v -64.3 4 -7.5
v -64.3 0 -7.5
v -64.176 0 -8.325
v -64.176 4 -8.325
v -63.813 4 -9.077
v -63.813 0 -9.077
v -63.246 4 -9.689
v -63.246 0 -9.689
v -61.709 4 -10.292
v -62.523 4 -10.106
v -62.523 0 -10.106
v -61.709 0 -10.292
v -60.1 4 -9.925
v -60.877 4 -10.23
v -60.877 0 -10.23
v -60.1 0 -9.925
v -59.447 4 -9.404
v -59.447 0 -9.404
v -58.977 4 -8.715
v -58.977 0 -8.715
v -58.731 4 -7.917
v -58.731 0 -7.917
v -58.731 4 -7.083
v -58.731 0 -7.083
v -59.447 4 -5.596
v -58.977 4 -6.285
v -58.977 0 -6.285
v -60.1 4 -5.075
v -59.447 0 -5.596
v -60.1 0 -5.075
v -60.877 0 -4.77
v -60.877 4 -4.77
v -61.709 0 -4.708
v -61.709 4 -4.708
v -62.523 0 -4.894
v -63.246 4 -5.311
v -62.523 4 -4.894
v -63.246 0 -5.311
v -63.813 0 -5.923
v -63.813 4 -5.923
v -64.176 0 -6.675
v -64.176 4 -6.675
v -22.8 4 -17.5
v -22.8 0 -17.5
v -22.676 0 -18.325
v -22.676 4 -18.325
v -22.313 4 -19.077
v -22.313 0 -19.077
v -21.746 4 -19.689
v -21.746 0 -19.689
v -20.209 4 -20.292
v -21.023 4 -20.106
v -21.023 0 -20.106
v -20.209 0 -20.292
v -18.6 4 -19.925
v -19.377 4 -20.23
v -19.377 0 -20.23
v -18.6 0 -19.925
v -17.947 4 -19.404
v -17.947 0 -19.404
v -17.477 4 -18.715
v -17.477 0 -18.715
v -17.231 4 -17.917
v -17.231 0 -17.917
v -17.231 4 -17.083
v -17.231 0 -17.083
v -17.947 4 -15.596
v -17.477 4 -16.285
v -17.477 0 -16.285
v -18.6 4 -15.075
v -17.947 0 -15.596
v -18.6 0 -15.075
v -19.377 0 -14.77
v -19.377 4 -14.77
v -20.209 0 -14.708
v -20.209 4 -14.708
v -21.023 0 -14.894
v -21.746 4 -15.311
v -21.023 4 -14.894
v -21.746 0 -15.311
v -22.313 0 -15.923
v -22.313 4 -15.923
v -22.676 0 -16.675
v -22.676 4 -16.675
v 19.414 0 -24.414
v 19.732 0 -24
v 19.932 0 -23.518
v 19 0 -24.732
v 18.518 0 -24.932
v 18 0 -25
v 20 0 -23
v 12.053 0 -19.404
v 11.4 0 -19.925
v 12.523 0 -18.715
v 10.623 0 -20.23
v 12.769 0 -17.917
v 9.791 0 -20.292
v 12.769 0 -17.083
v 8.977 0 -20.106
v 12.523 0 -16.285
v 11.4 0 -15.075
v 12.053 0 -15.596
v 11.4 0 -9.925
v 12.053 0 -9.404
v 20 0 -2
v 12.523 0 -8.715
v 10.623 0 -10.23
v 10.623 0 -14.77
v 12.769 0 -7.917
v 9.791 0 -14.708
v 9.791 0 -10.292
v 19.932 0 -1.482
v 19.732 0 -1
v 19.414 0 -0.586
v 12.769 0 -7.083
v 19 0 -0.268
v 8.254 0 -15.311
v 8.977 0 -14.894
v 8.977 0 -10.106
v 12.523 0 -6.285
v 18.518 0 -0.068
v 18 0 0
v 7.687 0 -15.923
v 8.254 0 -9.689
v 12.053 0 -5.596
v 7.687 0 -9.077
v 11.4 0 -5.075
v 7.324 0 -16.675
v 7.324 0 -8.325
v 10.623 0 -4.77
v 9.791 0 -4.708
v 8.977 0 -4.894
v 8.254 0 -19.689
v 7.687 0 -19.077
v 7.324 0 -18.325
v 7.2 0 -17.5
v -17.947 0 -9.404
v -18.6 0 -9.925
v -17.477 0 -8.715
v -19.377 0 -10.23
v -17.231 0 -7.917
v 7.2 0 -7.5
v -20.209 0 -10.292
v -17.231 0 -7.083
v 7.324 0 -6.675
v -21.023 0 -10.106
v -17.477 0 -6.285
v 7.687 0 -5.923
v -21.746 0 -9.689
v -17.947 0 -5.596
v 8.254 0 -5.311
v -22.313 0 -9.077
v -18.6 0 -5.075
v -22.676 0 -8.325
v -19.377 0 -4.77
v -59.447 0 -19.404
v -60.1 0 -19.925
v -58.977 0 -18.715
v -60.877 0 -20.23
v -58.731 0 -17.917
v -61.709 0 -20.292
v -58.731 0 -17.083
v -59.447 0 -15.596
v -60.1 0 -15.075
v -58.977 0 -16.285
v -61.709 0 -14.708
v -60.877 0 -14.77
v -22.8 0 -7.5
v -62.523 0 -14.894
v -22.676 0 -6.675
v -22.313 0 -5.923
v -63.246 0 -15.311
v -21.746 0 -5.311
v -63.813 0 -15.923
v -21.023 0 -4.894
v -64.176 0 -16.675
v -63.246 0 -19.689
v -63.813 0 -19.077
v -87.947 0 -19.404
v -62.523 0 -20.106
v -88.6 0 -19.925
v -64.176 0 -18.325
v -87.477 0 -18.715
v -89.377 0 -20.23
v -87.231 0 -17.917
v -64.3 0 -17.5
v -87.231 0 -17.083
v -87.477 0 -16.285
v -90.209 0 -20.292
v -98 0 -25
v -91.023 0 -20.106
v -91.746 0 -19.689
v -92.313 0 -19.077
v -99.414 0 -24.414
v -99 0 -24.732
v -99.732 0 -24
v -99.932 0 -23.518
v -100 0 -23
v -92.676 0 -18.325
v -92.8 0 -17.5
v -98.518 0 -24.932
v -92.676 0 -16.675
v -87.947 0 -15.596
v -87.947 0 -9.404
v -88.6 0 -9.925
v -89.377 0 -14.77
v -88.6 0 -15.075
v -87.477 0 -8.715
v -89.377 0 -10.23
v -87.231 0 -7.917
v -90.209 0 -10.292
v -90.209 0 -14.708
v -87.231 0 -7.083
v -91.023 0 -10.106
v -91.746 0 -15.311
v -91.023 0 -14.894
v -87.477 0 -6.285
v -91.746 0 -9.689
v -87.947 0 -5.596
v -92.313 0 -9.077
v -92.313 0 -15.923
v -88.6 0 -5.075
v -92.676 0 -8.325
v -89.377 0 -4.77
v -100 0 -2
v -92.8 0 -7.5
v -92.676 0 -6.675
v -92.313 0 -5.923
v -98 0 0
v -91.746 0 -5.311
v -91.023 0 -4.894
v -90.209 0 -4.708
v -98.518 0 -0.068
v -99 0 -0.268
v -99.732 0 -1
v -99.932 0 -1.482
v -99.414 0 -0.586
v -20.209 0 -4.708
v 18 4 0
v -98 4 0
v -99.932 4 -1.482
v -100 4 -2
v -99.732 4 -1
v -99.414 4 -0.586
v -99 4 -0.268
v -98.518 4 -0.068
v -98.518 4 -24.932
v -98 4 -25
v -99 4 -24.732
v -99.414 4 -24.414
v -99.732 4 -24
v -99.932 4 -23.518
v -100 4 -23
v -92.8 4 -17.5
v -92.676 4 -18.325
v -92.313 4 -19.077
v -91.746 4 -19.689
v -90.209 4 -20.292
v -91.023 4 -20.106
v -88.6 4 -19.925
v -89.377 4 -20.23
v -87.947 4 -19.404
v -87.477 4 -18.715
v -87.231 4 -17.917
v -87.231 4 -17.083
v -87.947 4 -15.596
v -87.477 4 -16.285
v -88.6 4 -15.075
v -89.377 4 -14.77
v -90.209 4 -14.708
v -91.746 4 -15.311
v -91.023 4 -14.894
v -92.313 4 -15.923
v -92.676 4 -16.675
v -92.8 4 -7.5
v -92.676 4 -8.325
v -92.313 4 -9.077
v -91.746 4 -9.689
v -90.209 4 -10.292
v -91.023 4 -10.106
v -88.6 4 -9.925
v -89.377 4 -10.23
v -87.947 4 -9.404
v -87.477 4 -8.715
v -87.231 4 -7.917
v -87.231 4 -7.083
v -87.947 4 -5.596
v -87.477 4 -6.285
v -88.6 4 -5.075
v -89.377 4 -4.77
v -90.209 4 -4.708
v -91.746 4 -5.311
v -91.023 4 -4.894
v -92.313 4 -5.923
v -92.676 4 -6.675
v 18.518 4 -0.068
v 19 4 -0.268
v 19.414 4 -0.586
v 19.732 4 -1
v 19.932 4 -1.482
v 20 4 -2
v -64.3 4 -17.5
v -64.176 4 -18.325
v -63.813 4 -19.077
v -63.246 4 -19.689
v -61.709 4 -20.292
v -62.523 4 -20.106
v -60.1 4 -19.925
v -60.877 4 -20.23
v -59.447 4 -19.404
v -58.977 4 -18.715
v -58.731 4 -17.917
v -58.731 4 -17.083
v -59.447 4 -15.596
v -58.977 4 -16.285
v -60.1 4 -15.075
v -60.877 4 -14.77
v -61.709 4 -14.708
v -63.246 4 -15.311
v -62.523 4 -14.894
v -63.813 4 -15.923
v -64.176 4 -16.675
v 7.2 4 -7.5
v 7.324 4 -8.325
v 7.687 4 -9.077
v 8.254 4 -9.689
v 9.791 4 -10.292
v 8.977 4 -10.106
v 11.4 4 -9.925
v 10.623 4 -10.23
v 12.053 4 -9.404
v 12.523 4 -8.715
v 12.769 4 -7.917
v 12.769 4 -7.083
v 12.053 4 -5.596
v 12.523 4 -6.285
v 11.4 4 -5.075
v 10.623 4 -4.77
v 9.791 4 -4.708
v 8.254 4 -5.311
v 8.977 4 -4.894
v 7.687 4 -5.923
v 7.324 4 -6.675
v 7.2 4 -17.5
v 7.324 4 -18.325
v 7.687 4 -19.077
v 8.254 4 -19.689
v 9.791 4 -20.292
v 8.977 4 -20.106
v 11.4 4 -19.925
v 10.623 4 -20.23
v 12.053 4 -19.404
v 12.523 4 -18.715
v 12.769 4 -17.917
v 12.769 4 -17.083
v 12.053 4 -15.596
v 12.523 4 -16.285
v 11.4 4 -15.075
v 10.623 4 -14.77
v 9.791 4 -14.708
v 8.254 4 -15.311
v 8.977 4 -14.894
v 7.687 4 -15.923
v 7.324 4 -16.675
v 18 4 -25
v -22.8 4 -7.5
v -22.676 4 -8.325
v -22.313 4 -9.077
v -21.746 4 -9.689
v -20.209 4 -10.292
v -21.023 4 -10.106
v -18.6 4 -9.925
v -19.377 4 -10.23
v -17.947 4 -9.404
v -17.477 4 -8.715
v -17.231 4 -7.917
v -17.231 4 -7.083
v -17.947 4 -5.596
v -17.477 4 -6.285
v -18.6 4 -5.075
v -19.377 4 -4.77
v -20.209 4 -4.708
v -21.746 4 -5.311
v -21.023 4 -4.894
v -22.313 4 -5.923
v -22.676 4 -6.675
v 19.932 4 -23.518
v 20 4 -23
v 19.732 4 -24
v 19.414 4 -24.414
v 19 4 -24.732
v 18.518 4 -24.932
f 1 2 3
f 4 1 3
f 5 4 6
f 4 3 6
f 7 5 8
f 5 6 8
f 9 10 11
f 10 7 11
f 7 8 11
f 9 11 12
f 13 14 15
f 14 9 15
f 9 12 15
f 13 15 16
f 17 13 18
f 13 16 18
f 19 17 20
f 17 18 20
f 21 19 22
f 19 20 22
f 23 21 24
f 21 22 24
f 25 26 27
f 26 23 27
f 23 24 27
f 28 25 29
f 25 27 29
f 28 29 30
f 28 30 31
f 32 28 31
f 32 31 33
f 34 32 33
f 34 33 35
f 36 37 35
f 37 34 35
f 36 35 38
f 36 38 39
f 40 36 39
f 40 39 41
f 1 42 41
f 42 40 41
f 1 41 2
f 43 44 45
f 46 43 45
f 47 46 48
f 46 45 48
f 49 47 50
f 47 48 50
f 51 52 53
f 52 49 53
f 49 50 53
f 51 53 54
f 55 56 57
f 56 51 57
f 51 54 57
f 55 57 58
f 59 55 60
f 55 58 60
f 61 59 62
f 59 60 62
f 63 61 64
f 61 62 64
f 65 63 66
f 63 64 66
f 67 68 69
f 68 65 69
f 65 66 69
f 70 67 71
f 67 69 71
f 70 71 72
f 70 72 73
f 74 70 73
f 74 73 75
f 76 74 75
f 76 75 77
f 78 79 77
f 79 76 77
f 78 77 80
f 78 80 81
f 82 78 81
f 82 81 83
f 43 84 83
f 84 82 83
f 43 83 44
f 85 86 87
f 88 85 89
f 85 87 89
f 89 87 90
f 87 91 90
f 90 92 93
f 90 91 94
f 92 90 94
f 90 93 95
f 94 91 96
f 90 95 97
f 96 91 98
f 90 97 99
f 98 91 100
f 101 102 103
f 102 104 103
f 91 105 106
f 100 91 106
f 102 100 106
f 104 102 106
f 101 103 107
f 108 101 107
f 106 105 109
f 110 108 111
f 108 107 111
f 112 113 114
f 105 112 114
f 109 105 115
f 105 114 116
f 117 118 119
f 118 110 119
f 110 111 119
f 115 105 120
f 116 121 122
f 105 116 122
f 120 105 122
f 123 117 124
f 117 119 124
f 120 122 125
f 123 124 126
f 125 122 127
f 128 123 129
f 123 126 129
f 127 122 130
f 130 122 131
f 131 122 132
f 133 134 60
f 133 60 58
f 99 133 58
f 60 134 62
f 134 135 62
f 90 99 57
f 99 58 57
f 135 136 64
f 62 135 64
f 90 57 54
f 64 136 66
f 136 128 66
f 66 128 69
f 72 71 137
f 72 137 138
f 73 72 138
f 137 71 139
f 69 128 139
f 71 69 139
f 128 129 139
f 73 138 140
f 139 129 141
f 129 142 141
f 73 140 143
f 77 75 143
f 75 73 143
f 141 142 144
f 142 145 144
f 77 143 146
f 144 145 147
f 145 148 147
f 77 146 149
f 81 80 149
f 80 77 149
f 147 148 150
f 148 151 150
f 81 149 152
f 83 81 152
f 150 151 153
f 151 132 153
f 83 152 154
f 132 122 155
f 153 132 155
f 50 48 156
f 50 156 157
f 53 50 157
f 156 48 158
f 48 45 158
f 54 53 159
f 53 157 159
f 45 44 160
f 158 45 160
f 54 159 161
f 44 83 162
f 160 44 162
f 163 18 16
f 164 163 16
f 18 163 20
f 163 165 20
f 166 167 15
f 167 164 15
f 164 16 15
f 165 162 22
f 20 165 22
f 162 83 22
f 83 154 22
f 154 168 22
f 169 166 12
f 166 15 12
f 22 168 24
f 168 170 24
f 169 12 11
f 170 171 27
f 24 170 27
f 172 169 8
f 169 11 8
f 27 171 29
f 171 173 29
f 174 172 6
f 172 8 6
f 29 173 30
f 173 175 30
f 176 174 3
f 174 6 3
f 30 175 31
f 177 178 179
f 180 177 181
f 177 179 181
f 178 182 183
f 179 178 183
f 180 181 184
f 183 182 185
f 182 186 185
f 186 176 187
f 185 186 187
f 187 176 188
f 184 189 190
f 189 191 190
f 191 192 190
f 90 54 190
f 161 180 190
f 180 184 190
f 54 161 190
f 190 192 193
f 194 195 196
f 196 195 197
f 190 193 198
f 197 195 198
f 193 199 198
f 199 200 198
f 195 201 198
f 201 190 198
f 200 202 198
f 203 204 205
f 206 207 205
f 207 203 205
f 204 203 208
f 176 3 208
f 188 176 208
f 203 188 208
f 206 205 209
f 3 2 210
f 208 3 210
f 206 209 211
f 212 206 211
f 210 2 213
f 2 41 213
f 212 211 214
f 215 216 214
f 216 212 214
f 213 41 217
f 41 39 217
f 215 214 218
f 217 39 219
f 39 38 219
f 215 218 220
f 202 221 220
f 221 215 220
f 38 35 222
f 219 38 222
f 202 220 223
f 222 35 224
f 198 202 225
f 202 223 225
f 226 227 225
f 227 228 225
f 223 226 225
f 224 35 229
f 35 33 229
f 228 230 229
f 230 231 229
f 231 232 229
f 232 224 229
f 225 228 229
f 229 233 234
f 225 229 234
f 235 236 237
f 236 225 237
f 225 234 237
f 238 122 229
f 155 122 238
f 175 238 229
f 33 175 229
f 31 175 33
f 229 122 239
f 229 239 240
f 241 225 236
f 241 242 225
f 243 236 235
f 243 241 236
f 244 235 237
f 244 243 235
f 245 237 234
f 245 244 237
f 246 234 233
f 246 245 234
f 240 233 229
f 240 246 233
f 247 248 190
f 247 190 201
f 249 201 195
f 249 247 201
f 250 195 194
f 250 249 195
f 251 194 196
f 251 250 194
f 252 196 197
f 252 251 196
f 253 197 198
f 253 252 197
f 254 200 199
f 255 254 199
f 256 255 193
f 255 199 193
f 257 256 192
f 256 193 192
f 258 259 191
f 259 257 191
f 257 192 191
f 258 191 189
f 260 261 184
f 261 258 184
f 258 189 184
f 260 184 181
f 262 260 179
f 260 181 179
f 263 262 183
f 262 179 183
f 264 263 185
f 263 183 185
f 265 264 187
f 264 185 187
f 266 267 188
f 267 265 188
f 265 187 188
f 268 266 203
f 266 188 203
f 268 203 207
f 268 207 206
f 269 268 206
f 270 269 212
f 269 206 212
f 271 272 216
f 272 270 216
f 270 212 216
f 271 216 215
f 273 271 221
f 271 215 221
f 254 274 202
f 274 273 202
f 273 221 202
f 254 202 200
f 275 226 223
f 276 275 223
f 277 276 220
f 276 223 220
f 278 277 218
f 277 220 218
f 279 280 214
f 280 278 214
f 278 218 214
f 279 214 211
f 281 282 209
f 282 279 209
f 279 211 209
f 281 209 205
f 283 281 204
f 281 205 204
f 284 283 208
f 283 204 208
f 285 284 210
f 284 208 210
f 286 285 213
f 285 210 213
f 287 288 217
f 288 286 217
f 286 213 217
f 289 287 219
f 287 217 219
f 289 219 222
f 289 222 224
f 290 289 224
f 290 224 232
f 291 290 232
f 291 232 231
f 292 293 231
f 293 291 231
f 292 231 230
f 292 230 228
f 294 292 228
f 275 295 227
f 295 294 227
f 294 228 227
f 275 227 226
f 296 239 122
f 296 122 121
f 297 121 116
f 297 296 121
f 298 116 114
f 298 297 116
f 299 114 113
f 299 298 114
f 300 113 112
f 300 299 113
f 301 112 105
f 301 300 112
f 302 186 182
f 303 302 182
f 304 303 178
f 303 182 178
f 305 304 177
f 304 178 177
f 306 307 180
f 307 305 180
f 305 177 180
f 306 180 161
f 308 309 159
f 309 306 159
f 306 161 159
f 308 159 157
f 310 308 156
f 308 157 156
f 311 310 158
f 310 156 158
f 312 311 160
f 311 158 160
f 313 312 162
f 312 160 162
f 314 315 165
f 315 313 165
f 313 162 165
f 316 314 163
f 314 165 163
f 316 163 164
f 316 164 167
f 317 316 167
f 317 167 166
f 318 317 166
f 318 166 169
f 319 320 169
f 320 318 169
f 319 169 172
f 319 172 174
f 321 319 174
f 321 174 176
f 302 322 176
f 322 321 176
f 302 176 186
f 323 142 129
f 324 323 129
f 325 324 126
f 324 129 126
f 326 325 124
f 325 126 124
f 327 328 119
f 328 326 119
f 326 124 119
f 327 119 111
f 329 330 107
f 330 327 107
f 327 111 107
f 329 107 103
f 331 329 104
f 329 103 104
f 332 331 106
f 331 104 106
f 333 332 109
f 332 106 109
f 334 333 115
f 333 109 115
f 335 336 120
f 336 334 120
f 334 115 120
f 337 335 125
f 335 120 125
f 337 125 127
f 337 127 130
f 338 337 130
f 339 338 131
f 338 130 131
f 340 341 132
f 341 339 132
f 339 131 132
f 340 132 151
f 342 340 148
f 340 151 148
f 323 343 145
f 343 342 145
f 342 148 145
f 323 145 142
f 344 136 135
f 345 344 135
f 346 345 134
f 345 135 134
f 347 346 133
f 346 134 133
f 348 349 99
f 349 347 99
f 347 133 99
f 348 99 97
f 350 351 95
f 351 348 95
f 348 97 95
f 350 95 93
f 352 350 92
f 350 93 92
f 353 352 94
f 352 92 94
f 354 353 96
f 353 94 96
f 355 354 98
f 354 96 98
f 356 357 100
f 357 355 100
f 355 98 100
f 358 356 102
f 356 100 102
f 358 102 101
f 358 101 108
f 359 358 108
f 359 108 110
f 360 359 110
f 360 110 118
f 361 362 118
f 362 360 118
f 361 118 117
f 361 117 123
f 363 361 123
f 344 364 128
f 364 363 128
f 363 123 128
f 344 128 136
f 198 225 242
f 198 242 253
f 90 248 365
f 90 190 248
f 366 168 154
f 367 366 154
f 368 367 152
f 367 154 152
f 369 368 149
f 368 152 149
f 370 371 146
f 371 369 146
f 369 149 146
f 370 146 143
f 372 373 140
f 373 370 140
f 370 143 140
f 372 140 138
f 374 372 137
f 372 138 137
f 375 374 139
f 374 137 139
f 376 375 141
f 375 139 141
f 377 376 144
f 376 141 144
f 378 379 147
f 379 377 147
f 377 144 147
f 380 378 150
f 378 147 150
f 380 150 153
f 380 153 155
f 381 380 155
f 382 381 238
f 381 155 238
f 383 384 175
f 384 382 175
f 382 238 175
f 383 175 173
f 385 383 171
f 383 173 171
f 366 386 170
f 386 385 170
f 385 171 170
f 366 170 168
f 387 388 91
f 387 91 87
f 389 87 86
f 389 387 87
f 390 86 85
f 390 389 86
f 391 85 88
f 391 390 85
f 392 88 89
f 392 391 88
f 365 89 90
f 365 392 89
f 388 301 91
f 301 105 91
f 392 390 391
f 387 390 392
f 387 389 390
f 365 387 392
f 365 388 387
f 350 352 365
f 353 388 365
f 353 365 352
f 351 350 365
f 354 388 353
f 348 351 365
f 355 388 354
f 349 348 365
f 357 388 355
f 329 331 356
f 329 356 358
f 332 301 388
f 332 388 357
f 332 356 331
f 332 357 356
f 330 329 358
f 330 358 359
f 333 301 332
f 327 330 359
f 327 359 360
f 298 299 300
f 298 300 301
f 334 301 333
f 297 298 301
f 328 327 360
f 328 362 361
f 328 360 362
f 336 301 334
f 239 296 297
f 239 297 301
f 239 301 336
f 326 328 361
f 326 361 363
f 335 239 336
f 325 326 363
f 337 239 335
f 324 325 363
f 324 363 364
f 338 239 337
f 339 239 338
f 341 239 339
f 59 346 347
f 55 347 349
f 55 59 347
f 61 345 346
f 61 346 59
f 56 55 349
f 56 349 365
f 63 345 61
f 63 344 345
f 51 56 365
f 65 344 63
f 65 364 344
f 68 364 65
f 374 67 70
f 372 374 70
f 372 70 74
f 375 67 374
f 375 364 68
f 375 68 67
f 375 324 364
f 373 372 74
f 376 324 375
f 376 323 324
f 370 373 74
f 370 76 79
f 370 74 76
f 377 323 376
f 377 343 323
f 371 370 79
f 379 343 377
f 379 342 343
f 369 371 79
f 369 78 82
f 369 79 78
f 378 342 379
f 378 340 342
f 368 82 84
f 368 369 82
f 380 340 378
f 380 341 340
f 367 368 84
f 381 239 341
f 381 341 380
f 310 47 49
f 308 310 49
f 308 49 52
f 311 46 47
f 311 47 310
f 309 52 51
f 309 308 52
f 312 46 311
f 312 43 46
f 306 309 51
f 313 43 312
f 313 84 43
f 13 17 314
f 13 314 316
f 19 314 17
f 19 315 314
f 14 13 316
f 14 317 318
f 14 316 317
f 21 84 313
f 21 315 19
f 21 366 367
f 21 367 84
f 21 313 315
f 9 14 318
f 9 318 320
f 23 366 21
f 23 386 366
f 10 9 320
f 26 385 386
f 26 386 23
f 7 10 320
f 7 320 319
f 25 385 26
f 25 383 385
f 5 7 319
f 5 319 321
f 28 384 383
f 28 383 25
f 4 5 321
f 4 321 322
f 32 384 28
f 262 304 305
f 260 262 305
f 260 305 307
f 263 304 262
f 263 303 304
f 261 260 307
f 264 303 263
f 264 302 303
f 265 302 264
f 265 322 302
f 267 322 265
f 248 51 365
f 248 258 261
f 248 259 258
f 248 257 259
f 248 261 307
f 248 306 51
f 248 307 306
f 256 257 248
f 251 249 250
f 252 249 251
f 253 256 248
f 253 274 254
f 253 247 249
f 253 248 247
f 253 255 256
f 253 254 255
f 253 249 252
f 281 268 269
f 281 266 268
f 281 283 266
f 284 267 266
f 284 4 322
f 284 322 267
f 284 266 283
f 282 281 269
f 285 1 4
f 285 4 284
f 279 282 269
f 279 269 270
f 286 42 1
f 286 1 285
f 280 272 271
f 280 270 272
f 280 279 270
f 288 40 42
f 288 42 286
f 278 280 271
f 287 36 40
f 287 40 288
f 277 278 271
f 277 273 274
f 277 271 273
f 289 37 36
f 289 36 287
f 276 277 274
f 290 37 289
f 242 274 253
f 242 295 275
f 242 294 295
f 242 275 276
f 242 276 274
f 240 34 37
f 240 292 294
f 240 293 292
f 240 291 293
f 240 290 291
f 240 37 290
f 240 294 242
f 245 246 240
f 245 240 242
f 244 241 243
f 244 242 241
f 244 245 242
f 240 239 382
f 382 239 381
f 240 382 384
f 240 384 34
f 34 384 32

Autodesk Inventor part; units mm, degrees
ref_plane "YZ Plane" through (0, 0, 0) normal (1, 0, 0) x (0, 1, 0)
ref_plane "XZ Plane" through (0, 0, 0) normal (0, 1, 0) x (-1, 0, 0)
ref_plane "XY Plane" through (0, 0, 0) normal (0, 0, 1) x (1, 0, 0)
sketch "Szkic1" plane through (0, 0, 0) normal (0, 1, 0) x (-1, 0, 0)
  line L0 (0, 0) -> (80, 0)
  line L1 (80, 0) -> (80, -25)
  line L2 (80, -25) -> (0, -25)
  line L3 (0, -25) -> (0, 0)
  line L4 (80, -12.5) -> (0, -12.5) construction
  circle A0 centre (61.5, -7.5) radius 2.8
  circle A1 centre (61.5, -17.5) radius 2.8
  circle A2 centre (20, -7.5) radius 2.8
  circle A3 centre (20, -17.5) radius 2.8
  line L5 (80, 0) -> (100, 0)
  line L6 (100, 0) -> (100, -25)
  line L7 (100, -25) -> (80, -25)
  line L8 (80, -25) -> (80, 0)
  line L9 (0, 0) -> (-20, 0)
  line L10 (-20, 0) -> (-20, -25)
  line L11 (-20, -25) -> (0, -25)
  line L12 (0, -25) -> (0, 0)
  circle A4 centre (-10, -7.5) radius 2.8
  circle A5 centre (-10, -17.5) radius 2.8
  circle A6 centre (90, -7.5) radius 2.8
  circle A7 centre (90, -17.5) radius 2.8
  dimension "d0" = 80
  dimension "d1" = 25
  dimension "d2" = 5.6
  dimension "d3" = 10
  dimension "d4" = 20
  dimension "d5" = 18.5
  dimension "d6" = 10
  dimension "d9" = 20
  dimension "d10" = 20
  dimension "d12" = 10
  dimension "d13" = 10
  dimension "d14" = 10
  dimension "d15" = 10
extrude "Wyciągnięcie proste1" add sketch "Szkic1" along normal blind 4
fillet "Zaokrąglenie1" radius 2 4 edges at (-100, 2, 0) (20, 2, 0) (20, 2, -25) (-100, 2, -25)
equation "\"d6\" = d3"
equation "\"d13\" = d3"
equation "\"d14\" = 0.5 * d10"
equation "\"d15\" = 0.5 * d9"
properties part number "belka_wzdluz" material "PLA"
